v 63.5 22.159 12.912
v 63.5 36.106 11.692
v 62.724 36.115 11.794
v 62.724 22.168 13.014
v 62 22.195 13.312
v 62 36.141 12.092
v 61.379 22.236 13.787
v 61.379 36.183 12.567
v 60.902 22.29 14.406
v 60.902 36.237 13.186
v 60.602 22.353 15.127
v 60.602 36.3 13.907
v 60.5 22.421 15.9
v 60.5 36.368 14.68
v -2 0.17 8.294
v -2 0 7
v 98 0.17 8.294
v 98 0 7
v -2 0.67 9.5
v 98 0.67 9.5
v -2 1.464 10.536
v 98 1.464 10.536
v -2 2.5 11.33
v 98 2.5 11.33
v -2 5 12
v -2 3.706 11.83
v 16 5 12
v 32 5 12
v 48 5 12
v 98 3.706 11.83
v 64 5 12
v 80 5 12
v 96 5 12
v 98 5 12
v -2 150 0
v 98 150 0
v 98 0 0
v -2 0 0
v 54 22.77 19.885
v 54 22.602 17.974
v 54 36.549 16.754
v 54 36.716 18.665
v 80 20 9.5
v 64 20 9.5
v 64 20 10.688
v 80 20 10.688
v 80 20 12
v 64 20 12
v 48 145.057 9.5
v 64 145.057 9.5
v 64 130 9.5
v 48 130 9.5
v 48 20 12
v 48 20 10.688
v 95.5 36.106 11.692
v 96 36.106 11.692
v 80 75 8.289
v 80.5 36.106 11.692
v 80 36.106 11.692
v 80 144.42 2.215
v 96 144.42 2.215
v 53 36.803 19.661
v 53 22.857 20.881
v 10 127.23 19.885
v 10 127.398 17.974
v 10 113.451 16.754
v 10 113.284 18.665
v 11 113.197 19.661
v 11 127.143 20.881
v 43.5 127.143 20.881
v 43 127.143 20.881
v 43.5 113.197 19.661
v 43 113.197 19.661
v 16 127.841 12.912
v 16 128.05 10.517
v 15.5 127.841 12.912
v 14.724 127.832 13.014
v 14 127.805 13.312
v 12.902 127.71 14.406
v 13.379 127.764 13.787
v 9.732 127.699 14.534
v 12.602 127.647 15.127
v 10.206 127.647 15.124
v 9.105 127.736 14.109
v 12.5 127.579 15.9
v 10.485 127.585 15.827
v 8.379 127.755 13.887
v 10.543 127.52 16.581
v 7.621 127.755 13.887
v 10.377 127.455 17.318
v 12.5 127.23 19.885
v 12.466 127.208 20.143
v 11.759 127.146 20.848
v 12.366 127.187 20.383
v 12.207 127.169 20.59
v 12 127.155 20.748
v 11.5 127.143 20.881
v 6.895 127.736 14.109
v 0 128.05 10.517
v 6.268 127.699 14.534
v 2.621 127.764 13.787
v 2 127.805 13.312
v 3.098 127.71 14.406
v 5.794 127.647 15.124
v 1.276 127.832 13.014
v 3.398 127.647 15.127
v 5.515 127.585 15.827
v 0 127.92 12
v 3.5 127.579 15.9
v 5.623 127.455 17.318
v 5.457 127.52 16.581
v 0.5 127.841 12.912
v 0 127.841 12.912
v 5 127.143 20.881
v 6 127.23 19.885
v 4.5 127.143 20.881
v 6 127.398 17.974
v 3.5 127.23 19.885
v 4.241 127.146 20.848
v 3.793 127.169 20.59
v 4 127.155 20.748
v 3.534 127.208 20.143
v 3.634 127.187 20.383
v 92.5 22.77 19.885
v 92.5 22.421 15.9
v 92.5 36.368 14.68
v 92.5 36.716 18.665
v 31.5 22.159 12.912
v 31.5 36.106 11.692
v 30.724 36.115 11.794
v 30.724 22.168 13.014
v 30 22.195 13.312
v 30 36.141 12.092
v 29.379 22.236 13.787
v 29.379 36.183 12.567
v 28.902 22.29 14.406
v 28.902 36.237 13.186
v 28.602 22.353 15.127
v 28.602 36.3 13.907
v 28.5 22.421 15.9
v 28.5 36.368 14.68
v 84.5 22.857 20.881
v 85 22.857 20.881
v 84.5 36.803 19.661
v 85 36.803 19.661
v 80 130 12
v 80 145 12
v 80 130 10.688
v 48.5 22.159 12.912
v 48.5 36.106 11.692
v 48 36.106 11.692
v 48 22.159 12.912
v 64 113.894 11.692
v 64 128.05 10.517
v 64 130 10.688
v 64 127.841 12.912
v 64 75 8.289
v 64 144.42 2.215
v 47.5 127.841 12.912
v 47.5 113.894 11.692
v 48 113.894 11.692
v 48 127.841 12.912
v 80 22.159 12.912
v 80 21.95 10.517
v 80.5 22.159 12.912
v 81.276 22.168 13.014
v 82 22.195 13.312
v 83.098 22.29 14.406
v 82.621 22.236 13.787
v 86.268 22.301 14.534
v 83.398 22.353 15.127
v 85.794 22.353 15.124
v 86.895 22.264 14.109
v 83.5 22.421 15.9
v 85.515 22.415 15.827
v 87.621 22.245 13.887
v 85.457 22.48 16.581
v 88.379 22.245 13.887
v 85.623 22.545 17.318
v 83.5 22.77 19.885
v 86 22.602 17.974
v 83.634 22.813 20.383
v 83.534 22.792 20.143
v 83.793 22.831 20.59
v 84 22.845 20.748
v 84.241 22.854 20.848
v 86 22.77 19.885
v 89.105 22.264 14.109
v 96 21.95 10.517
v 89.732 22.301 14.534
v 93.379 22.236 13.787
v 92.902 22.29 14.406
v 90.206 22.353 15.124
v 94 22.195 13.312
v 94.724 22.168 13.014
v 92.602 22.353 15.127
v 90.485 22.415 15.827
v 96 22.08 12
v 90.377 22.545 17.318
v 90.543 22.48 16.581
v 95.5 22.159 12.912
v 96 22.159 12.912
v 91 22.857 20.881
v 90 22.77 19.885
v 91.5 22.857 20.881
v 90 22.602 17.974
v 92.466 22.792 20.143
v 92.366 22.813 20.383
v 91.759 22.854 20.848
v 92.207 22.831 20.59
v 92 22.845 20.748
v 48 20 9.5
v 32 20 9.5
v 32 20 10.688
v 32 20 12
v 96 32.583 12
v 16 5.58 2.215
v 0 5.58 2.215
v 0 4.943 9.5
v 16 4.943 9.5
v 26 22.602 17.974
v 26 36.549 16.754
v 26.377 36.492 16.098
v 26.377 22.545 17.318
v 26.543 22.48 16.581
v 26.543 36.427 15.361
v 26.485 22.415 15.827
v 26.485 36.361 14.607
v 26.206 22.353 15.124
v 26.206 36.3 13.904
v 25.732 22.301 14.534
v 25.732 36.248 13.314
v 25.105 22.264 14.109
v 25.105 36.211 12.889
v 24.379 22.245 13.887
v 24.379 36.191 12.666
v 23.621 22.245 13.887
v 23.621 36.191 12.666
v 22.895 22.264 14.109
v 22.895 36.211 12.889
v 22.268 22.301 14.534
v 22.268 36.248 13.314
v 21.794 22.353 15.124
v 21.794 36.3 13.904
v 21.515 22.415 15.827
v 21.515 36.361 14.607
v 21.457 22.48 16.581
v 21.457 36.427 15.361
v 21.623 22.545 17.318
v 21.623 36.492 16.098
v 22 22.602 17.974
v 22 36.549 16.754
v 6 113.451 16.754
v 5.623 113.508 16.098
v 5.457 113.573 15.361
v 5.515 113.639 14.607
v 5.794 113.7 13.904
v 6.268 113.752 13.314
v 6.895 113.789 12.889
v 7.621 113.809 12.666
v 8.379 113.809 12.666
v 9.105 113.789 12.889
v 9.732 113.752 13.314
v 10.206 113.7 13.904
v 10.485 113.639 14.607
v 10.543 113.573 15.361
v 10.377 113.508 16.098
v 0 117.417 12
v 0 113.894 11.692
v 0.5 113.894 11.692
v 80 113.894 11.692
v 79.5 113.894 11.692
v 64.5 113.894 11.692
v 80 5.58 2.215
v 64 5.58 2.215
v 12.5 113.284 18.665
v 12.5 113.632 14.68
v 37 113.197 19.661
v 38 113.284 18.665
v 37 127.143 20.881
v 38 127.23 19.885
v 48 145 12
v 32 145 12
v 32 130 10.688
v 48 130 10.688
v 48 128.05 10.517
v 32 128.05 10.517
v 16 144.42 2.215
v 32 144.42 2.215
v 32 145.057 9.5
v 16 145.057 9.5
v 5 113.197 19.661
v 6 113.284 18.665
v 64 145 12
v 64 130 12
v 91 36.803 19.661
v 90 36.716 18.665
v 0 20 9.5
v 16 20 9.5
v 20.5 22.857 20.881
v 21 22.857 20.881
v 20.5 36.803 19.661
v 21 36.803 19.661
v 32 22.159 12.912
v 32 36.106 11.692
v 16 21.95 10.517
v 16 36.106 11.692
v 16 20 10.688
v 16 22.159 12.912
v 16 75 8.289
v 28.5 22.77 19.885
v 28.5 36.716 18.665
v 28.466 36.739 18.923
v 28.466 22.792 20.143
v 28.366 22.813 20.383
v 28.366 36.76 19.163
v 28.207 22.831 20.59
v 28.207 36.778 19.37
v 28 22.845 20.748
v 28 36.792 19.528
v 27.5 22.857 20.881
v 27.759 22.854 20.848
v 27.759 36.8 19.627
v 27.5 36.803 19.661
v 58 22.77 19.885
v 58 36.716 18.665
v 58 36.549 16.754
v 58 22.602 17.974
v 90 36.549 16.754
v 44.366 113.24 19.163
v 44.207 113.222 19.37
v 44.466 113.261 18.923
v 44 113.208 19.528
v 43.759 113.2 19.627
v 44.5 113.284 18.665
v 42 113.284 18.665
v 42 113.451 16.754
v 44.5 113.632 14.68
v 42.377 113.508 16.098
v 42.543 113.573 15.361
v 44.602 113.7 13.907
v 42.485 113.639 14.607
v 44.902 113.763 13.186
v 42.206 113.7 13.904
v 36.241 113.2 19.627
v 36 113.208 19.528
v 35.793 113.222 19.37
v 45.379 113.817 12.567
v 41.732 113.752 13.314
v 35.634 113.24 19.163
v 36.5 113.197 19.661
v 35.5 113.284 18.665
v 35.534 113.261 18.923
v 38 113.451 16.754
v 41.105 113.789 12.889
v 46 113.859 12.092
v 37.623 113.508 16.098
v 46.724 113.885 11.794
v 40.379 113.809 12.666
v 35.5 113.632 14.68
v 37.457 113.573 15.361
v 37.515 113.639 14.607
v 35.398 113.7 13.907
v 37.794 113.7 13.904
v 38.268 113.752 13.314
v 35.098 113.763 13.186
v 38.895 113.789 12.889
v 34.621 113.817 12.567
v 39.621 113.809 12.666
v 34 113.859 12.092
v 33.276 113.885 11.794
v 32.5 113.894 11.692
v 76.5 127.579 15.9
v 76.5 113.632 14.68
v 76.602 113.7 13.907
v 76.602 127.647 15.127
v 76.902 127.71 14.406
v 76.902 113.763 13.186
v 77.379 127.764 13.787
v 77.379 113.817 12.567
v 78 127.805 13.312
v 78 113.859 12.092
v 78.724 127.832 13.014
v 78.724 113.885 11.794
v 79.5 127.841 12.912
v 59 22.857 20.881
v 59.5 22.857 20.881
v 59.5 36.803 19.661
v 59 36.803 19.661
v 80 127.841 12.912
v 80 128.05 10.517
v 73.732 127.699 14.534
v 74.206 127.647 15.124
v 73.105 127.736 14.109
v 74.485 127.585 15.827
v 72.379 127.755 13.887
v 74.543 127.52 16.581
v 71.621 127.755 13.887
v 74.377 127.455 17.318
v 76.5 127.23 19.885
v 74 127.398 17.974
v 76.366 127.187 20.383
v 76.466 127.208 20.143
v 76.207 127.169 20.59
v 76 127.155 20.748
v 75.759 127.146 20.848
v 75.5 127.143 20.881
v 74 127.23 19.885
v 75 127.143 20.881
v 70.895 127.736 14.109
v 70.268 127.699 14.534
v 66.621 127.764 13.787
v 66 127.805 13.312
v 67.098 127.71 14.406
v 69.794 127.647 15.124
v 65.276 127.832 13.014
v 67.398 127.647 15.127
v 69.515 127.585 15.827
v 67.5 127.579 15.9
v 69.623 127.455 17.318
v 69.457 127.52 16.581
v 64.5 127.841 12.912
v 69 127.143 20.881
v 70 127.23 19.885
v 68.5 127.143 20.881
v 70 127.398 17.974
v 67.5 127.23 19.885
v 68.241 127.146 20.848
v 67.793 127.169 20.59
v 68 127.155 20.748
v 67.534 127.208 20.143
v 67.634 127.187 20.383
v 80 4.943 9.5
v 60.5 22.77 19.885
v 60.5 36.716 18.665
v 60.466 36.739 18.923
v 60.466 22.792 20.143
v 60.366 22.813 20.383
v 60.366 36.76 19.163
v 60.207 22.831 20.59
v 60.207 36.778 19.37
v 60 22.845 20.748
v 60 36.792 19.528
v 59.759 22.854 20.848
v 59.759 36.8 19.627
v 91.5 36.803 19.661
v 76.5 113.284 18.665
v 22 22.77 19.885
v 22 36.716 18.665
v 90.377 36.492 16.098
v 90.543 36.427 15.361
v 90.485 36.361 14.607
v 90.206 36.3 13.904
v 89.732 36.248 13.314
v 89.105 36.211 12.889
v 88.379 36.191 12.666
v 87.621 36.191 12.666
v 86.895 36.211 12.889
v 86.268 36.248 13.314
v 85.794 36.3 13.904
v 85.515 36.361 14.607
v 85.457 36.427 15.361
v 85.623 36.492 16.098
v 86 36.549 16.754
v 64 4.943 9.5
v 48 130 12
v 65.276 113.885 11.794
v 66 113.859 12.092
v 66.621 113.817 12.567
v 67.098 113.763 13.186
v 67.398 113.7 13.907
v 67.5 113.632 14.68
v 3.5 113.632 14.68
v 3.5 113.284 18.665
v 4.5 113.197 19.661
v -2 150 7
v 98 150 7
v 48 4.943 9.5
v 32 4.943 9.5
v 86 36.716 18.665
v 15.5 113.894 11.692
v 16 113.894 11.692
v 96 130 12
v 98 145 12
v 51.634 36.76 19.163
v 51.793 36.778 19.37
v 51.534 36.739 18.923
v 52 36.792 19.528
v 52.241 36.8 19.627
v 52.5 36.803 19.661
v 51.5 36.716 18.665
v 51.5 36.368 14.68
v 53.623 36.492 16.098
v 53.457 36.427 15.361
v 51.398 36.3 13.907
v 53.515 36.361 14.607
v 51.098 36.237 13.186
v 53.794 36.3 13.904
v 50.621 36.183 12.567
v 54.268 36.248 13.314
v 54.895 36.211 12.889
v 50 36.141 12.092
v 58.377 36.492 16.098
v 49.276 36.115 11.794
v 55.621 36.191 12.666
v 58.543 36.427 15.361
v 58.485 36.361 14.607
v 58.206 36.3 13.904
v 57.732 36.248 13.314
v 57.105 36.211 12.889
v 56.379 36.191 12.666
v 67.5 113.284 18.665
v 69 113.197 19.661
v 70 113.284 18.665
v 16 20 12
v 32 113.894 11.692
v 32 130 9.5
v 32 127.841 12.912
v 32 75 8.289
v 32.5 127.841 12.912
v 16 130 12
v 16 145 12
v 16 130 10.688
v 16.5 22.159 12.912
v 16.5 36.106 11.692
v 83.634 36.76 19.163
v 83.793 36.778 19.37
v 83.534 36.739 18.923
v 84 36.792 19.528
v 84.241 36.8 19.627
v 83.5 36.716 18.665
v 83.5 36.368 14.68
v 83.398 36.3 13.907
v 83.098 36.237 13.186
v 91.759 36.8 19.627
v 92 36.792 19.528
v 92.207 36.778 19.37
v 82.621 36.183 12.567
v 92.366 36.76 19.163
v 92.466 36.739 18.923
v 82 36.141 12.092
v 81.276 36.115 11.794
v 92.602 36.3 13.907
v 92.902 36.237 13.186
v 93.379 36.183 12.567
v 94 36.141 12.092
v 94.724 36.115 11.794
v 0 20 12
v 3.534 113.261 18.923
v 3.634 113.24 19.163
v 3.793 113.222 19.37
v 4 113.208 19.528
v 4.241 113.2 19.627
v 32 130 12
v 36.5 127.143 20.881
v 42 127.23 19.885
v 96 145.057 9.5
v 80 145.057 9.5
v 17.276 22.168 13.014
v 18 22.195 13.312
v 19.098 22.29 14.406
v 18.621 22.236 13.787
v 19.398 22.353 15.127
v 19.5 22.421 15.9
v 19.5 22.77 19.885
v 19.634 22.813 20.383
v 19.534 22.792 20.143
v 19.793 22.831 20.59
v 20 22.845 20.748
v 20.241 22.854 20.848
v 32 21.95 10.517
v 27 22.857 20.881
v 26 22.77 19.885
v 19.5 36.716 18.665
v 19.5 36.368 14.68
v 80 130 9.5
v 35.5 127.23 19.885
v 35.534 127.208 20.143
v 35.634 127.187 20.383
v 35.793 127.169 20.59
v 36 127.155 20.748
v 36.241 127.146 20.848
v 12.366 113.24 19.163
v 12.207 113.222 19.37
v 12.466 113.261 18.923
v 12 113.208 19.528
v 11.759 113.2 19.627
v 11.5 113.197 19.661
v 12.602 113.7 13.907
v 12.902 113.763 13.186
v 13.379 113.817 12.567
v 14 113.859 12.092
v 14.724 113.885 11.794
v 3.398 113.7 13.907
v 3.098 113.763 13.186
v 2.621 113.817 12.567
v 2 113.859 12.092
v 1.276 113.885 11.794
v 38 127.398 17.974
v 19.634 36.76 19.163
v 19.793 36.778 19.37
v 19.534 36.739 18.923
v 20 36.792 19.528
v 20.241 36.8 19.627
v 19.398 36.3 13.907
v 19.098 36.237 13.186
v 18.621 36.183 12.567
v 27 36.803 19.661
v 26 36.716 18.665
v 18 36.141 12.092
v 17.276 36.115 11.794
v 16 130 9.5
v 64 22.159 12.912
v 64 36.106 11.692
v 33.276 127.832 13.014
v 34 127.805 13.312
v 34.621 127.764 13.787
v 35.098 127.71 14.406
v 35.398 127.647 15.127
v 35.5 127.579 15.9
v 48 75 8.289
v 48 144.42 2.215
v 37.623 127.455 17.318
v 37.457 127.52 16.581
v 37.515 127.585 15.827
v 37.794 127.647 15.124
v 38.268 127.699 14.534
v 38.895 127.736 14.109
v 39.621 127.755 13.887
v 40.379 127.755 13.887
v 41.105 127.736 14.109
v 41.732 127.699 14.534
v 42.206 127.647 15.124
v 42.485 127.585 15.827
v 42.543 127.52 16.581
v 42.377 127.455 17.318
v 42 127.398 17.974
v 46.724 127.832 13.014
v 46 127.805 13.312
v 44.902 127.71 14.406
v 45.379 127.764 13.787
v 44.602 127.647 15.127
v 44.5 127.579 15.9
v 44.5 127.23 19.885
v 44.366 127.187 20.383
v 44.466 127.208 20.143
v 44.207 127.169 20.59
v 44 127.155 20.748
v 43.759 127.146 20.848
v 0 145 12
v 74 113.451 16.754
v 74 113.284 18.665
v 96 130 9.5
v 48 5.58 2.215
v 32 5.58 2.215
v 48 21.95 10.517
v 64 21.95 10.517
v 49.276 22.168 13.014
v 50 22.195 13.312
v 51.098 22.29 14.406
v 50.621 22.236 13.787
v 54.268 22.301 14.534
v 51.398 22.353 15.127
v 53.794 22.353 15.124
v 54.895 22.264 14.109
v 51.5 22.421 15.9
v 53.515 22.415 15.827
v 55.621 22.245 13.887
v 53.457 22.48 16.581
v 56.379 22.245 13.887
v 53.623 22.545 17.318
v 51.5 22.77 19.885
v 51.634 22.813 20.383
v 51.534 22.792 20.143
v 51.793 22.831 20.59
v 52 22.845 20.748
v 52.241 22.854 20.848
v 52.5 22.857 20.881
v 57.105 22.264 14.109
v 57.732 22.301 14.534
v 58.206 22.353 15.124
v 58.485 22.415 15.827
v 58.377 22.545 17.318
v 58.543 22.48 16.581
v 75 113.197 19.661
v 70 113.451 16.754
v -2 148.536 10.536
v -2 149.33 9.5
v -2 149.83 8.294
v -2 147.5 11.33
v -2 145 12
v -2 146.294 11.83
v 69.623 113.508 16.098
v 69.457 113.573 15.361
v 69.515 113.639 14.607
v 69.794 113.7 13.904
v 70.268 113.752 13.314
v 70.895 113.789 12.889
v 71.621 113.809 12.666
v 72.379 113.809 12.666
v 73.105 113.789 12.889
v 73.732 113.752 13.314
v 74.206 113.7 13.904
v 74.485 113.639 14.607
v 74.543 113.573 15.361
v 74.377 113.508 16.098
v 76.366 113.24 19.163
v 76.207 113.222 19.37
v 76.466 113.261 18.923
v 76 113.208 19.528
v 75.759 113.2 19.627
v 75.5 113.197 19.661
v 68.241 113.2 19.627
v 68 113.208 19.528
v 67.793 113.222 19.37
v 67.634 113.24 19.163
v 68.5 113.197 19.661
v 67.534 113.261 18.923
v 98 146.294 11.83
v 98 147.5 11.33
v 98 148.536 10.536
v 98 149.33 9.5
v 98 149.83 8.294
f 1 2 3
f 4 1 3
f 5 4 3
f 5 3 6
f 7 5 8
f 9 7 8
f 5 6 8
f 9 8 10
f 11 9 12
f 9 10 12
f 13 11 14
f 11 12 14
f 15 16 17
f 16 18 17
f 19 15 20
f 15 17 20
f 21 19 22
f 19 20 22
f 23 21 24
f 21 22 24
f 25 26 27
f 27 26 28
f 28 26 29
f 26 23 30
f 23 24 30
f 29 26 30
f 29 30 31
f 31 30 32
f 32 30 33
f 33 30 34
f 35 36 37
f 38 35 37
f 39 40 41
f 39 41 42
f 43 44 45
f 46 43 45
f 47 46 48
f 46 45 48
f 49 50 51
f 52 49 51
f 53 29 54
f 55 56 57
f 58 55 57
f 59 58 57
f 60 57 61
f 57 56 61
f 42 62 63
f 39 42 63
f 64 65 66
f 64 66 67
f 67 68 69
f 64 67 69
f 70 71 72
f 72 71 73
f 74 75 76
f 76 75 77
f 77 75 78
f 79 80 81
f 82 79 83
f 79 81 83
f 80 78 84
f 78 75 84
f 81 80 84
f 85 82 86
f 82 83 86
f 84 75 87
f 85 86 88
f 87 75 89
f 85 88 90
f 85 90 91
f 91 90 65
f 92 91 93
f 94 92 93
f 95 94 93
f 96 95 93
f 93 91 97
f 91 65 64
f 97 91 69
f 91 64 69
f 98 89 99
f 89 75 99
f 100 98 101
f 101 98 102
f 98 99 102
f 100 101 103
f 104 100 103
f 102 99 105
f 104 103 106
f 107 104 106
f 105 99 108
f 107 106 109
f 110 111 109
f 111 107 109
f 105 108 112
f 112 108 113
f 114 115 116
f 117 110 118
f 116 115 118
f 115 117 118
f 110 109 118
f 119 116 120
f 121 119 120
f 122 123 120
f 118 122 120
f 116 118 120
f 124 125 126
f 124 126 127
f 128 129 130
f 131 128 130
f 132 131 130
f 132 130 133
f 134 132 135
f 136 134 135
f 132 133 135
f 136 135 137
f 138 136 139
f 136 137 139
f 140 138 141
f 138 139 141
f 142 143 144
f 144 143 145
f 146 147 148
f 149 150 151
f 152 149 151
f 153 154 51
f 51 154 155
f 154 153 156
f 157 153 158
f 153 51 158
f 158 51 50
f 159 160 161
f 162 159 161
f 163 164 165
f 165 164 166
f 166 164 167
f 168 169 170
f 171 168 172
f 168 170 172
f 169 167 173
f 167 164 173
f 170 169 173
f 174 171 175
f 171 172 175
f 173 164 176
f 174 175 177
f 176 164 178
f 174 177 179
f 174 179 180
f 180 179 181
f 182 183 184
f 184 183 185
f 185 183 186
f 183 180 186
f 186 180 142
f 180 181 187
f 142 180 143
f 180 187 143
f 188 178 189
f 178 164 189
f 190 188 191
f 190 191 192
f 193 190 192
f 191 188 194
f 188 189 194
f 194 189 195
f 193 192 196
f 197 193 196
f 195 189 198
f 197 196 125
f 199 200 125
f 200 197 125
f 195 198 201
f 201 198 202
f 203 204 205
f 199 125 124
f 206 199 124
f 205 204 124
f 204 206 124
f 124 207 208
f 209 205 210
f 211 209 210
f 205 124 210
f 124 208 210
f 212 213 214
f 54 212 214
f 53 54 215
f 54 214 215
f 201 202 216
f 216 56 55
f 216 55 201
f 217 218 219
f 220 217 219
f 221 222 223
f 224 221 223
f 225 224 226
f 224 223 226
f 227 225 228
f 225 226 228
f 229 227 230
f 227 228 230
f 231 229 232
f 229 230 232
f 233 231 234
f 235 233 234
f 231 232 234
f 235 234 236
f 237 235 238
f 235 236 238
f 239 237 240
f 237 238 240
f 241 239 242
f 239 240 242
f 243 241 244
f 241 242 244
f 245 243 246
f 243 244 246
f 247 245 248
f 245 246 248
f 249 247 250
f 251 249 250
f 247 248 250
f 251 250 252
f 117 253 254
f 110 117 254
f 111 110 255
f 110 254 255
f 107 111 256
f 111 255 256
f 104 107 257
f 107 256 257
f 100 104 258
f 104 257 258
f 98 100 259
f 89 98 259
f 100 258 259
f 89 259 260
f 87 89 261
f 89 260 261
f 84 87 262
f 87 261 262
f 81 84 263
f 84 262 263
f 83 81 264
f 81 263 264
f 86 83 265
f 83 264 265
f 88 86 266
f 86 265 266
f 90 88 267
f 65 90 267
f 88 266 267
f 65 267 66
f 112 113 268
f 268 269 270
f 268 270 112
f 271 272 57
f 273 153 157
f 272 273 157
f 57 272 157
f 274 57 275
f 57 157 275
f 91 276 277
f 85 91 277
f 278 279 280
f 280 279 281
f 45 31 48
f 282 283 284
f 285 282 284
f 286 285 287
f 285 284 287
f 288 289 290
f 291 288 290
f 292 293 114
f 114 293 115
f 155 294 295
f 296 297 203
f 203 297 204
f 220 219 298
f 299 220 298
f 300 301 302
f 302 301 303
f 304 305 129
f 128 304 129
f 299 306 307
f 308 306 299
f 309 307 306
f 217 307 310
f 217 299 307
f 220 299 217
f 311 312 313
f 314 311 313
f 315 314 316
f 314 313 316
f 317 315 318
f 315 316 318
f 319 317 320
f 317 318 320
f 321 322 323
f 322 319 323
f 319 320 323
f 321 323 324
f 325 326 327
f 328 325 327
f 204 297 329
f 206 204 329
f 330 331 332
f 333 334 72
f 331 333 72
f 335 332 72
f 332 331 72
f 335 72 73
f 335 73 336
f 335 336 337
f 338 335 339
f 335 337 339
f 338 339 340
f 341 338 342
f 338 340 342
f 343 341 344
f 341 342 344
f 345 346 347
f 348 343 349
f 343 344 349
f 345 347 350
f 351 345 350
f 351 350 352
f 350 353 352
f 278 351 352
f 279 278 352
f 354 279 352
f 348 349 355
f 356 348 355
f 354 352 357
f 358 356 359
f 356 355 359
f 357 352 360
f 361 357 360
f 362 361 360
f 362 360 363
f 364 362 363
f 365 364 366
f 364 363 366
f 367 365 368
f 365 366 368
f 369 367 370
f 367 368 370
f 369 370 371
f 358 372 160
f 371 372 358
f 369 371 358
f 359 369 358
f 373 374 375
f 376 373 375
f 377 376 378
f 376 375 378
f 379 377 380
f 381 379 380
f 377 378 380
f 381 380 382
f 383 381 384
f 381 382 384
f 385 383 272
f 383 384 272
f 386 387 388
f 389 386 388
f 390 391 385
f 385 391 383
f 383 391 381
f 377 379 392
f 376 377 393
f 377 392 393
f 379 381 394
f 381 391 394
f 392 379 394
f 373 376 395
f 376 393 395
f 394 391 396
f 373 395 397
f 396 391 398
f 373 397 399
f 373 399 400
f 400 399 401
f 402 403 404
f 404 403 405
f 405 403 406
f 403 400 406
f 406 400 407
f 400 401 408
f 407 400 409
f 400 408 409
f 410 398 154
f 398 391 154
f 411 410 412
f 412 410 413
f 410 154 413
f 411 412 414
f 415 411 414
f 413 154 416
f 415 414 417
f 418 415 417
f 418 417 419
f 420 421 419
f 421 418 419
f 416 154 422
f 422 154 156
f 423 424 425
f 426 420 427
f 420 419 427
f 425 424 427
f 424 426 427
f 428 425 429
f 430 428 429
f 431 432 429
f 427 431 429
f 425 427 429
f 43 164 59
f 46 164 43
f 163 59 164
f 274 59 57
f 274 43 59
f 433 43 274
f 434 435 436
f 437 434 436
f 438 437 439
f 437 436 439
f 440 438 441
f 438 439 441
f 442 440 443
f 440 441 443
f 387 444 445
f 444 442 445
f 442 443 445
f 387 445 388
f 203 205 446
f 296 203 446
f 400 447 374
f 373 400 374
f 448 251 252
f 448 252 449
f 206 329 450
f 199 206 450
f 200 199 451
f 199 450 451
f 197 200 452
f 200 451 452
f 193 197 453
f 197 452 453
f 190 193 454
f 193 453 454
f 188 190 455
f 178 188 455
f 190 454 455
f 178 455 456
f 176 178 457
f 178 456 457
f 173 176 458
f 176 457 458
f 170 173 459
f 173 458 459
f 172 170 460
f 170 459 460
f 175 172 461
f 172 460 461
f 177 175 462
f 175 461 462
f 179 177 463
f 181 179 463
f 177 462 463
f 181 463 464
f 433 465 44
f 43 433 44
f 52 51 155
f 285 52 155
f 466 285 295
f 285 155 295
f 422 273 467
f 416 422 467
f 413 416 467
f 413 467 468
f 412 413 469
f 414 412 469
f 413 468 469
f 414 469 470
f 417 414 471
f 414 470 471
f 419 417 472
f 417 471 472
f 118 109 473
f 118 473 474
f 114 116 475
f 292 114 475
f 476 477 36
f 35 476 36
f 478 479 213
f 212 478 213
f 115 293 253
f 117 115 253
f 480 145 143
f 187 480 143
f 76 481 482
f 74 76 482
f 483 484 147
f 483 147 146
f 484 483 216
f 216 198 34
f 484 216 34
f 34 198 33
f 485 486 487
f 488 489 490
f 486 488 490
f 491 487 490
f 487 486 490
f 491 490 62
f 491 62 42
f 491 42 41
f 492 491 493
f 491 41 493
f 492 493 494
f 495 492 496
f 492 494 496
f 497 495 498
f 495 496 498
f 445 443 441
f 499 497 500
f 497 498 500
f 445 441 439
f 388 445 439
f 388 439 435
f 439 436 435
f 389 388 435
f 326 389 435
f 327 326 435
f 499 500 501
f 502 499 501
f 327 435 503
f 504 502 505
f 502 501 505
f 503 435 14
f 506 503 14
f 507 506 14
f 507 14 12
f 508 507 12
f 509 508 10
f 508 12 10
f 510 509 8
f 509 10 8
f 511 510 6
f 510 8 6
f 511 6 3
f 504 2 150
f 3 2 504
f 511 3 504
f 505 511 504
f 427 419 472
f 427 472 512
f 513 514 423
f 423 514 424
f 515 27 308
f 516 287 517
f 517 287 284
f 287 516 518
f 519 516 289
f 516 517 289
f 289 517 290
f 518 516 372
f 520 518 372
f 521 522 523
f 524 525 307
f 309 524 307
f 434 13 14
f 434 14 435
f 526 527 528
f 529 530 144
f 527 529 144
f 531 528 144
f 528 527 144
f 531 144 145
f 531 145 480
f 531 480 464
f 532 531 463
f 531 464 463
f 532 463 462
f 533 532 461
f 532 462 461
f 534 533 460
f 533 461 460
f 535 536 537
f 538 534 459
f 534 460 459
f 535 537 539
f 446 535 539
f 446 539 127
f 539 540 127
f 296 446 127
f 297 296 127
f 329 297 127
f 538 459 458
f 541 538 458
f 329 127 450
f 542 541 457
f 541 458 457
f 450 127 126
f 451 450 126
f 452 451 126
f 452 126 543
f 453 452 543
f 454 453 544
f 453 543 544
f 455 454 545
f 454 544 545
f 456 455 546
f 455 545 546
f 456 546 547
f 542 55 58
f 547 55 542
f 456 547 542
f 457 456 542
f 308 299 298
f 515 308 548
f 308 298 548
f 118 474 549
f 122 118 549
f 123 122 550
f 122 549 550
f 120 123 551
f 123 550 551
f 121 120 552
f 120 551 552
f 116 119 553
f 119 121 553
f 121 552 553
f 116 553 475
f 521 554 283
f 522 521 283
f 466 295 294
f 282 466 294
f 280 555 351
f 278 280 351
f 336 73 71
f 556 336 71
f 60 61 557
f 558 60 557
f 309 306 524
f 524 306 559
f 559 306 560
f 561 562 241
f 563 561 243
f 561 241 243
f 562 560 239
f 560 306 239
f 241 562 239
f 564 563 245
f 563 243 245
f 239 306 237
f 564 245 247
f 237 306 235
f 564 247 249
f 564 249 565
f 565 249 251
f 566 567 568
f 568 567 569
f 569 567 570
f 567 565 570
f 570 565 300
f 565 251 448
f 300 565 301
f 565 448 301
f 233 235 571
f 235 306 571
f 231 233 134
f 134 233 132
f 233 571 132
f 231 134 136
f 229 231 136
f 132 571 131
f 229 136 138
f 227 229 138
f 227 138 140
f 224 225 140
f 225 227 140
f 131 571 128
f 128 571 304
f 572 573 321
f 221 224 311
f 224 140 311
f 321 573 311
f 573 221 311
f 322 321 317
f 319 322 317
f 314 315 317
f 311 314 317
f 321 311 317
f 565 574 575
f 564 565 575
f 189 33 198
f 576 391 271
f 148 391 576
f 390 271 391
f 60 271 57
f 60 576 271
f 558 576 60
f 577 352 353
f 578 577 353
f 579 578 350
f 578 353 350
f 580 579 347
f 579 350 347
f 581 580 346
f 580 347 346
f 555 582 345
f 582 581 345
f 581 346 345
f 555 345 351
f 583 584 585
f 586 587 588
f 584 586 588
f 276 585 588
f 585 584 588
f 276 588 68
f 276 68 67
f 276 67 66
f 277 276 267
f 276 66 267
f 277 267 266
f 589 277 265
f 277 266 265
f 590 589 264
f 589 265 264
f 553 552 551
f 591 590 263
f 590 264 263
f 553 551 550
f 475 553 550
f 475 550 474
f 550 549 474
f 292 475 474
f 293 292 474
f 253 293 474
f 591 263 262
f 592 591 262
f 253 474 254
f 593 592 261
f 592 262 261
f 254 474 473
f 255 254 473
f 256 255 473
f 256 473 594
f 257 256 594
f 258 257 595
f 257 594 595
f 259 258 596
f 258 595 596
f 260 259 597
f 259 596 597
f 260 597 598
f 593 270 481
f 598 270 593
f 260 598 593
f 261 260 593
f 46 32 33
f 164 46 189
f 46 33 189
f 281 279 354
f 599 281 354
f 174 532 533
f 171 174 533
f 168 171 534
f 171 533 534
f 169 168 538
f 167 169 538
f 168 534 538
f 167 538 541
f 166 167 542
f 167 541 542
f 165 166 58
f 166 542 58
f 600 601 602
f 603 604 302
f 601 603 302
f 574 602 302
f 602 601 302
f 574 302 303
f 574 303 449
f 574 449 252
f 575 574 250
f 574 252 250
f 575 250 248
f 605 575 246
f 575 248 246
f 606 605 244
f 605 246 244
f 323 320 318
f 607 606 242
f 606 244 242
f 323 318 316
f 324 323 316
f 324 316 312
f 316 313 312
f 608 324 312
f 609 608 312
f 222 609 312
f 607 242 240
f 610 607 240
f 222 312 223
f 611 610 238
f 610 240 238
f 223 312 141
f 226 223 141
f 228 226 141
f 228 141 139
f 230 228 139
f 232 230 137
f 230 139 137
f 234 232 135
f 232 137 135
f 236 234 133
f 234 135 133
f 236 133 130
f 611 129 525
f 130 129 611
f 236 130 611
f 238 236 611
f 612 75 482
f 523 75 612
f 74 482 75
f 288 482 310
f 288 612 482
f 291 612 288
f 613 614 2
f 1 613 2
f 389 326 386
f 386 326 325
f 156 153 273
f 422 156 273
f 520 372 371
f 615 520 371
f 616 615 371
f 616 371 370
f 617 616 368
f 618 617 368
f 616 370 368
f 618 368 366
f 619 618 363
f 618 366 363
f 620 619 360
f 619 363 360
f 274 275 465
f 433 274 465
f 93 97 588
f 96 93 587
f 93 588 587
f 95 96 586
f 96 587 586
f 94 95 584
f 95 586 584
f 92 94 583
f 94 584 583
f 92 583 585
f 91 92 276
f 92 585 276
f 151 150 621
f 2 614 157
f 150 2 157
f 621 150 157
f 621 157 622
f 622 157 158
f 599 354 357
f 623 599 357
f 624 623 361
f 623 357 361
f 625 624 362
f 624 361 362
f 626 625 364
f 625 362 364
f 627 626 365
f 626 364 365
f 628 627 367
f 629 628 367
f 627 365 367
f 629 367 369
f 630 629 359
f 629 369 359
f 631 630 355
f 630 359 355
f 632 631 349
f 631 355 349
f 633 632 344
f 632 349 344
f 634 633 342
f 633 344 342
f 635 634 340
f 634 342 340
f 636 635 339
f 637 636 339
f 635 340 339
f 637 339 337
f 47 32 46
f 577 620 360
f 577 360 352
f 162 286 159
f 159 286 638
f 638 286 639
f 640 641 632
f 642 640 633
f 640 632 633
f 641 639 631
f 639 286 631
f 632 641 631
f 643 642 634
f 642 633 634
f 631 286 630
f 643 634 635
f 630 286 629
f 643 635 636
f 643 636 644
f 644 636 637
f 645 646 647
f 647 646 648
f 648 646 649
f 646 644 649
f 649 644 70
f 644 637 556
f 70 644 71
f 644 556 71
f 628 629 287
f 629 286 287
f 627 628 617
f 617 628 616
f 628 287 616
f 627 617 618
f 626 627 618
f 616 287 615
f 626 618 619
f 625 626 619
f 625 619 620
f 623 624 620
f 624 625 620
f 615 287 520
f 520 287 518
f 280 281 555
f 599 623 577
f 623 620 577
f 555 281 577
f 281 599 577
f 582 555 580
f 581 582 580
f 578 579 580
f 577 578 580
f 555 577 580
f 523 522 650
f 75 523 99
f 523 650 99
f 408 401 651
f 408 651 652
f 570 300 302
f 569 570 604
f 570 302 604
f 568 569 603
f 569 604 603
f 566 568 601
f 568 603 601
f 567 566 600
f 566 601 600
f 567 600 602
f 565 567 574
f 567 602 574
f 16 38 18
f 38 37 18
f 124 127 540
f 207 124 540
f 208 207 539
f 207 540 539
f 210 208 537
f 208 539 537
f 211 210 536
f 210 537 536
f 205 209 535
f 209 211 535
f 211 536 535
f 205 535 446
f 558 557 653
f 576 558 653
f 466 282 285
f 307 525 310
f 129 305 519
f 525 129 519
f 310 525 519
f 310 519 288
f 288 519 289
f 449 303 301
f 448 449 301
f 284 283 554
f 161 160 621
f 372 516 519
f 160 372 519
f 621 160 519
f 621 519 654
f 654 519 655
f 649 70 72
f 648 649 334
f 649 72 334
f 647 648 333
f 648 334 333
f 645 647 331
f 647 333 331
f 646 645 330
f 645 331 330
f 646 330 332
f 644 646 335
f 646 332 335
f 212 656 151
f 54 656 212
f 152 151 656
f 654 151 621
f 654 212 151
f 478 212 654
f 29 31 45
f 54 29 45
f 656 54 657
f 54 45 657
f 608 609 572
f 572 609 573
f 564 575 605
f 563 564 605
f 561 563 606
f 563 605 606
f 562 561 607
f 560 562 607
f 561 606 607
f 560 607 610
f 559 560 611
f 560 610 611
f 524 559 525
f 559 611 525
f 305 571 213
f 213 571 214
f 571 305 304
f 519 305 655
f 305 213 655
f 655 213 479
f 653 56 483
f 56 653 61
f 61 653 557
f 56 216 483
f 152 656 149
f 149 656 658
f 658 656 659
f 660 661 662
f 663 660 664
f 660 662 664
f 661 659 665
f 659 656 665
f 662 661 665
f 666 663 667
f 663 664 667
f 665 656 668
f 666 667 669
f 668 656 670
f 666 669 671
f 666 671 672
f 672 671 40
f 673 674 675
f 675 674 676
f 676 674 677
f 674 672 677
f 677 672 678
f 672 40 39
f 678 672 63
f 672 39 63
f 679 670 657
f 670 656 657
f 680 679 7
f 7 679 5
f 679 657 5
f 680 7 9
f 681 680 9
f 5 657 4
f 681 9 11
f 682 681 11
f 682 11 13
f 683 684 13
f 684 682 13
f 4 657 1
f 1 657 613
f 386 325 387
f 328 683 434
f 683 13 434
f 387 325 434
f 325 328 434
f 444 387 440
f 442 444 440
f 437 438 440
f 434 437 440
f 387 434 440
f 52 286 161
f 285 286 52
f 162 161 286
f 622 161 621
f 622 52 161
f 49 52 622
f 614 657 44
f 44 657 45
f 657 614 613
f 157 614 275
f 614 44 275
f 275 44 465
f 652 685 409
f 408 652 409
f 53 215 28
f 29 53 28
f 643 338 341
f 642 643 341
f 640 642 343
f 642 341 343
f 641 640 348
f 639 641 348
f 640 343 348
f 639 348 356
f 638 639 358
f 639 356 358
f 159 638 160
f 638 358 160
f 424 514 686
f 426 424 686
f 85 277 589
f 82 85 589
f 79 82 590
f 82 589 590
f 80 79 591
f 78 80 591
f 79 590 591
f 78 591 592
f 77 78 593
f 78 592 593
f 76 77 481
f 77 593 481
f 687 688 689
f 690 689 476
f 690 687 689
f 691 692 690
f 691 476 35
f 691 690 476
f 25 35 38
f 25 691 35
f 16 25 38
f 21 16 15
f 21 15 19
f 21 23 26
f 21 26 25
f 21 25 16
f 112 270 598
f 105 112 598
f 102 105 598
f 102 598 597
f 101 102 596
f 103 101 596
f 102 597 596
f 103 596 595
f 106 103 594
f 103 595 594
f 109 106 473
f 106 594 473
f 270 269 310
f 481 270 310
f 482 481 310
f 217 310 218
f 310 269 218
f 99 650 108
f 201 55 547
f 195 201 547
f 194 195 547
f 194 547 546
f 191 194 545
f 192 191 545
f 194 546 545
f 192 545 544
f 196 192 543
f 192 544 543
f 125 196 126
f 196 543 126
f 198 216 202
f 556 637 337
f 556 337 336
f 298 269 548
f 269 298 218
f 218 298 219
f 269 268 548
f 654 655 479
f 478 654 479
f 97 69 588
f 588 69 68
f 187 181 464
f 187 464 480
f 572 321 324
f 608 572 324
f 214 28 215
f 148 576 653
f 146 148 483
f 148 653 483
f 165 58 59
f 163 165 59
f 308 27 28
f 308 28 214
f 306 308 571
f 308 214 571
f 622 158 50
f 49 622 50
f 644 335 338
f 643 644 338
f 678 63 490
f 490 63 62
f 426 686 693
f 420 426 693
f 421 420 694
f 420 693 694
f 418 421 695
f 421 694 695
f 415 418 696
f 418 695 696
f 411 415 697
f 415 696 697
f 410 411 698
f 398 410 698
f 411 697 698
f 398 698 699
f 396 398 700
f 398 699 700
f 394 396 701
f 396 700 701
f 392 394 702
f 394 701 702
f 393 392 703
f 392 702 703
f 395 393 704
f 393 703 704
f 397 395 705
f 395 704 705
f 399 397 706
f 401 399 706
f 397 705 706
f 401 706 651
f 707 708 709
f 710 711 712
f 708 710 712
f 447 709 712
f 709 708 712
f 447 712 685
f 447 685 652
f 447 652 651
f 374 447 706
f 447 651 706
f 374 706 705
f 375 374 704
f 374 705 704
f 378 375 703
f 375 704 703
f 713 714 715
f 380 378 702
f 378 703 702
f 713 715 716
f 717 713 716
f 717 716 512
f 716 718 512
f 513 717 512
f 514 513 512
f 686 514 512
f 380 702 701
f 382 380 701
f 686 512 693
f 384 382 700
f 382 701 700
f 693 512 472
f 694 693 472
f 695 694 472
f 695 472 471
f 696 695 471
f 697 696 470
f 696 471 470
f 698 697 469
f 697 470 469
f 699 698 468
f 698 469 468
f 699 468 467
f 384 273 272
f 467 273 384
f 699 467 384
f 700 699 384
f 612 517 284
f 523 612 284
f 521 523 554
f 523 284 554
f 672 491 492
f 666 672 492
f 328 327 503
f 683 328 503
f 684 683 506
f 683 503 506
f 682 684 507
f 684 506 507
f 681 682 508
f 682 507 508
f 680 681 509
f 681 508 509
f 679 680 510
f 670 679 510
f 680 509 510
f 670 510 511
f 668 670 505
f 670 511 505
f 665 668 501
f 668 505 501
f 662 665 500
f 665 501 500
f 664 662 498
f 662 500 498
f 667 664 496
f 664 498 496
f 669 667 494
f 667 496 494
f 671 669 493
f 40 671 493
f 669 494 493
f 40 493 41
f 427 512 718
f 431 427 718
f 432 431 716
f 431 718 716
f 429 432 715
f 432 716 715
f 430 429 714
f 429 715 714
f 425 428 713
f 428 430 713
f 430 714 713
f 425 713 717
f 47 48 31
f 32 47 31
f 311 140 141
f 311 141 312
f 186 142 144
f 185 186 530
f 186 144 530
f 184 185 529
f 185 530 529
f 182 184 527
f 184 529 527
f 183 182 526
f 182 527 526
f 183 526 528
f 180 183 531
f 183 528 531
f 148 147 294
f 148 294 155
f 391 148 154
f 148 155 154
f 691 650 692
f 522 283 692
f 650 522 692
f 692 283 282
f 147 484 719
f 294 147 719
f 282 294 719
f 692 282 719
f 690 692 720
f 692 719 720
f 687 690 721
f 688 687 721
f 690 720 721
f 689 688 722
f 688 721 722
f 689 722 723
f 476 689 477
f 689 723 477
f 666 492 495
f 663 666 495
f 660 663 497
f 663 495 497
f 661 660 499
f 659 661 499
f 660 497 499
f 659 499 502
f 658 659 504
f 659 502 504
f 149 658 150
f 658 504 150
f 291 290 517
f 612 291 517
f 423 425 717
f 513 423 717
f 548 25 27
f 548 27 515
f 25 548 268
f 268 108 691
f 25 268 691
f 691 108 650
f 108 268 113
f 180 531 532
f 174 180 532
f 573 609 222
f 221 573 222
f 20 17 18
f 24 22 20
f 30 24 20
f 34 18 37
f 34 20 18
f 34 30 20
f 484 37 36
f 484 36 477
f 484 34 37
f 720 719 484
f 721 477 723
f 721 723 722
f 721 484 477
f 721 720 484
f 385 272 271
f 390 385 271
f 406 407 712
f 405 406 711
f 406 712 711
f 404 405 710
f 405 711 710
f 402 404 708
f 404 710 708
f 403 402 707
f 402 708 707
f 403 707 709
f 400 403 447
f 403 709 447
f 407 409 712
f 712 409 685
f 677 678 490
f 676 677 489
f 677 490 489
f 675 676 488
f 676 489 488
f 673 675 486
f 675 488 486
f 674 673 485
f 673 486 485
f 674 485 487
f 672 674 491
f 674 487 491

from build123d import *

# Parameters (mm, degrees)
F1_DEPTH  = 16
F3_DEPTH  = 25
F4_SIZE   = 1
F11_ANGLE = 180
F14_DEPTH = 2
F16_DEPTH = 2


with BuildPart() as f1:
    # F0 (on Right) → F1 (new body)
    with BuildSketch(Plane.YZ):
        with BuildLine():
            Line((0, 7), (0, 0))
            Line((0, 0), (150, 0))
            Line((150, 0), (150, 7))
            ThreePointArc((150, 7), (148.5355339059, 10.5355339059), (145, 12))
            Line((145, 12), (128.050036002, 10.517070303))
            Line((128.050036002, 10.517070303), (127.1432693018, 20.8814611121))
            Line((127.1432693018, 20.8814611121), (113.1965435286, 19.6612807136))
            Line((113.1965435286, 19.6612807136), (113.8937894705, 11.6917231289))
            Line((113.8937894705, 11.6917231289), (5.5800139851, 2.2154956702))
            Line((5.5800139851, 2.2154956702), (4.9427024368, 9.5))
            Line((4.9427024368, 9.5), (20, 9.5))
            Line((20, 9.5), (20, 12))
            Line((20, 12), (5, 12))
            ThreePointArc((5, 12), (1.4644660941, 10.5355339059), (0, 7))
        make_face()
    extrude(amount=F1_DEPTH)

    # F2 (on face) → F3 (cut)
    with BuildSketch(Plane(origin=(0, 114.0437613881, 9.9775362673), x_dir=(1, 0, 0), z_dir=(0, -0.9961946981, -0.0871557427))):
        with BuildLine():
            Line((6, 9.7207347769), (6, 6.8026639789))
            ThreePointArc((6, 6.8026639789), (8, 2.6707347769), (10, 6.8026639789))
            Line((10, 6.8026639789), (10, 9.7207347769))
            Line((10, 9.7207347769), (11.5, 9.7207347769))
            ThreePointArc((11.5, 9.7207347769), (12.2071067812, 9.4278415581), (12.5, 8.7207347769))
            Line((12.5, 8.7207347769), (12.5, 4.7207347769))
            ThreePointArc((12.5, 4.7207347769), (13.3786796564, 2.5994144334), (15.5, 1.7207347769))
            Line((15.5, 1.7207347769), (18.5, 1.7207347769))
            Line((18.5, 1.7207347769), (18.5, 10.7207347769))
            Line((18.5, 10.7207347769), (-2.5, 10.7207347769))
            Line((-2.5, 10.7207347769), (-2.5, 1.7207347769))
            Line((-2.5, 1.7207347769), (0.5, 1.7207347769))
            ThreePointArc((0.5, 1.7207347769), (2.6213203436, 2.5994144334), (3.5, 4.7207347769))
            Line((3.5, 4.7207347769), (3.5, 8.7207347769))
            ThreePointArc((3.5, 8.7207347769), (3.7928932188, 9.4278415581), (4.5, 9.7207347769))
            Line((4.5, 9.7207347769), (6, 9.7207347769))
        make_face()
    extrude(amount=-F3_DEPTH, mode=Mode.SUBTRACT)

    # F4
    f4_edges = [f1.edges().sort_by_distance(p)[0] for p in [
        (6, 120.169906, 20.271371),
        (10, 120.169906, 20.271371),
    ]]
    chamfer(f4_edges, length=F4_SIZE)


with BuildPart() as f5_1:
    # F5: copy of F1
    add(f1.part.moved(Location((32, 0, 0))))


with BuildPart() as f6_1:
    # F6: copy of F5_1
    add(f5_1.part.moved(Location((32, 0, 0))))


with BuildPart() as f7_1:
    # F7: copy of F1
    add(f1.part.moved(Location((0, 160, 0))))


with BuildPart() as f8_1:
    # F8: copy of F5_1
    add(f5_1.part.moved(Location((0, 160, 0))))


with BuildPart() as f9_1:
    # F9: copy of F6_1
    add(f6_1.part.moved(Location((0, 160, 0))))


with BuildPart() as f8_1_1:
    # F11: moved
    add(f8_1.part.rotate(Axis((0, 0, 25), (0, 0, 1)), F11_ANGLE))


with BuildPart() as f9_1_1:
    # F11: moved
    add(f9_1.part.rotate(Axis((0, 0, 25), (0, 0, 1)), F11_ANGLE))


with BuildPart() as f7_1_1:
    # F11: moved
    add(f7_1.part.rotate(Axis((0, 0, 25), (0, 0, 1)), F11_ANGLE))


with BuildPart() as f7_1_2:
    # F12: moved
    add(f7_1_1.part.moved(Location((96, 310, 0))))

    # F13 (on face) → F14 (join)
    with BuildSketch(Plane.YZ.offset(96)):
        with BuildLine():
            Line((0, 7), (0, 0))
            Line((0, 0), (150, 0))
            Line((150, 0), (150, 7))
            ThreePointArc((150, 7), (148.5355339059, 10.5355339059), (145, 12))
            Line((145, 12), (5, 12))
            ThreePointArc((5, 12), (1.4644660941, 10.5355339059), (0, 7))
        make_face()
    extrude(amount=F14_DEPTH)


with BuildPart() as f8_1_2:
    # F12: moved
    add(f8_1_1.part.moved(Location((96, 310, 0))))


with BuildPart() as f9_1_2:
    # F12: moved
    add(f9_1_1.part.moved(Location((96, 310, 0))))


with BuildPart() as f1_1:
    add(f1.part)

    add(f5_1.part)  # F16 merges F5_1

    add(f6_1.part)  # F16 merges F6_1

    add(f7_1_2.part)  # F16 merges F7_1

    add(f8_1_2.part)  # F16 merges F8_1

    add(f9_1_2.part)  # F16 merges F9_1
    # F15 (on face) → F16 (join)
    with BuildSketch(Plane(origin=(0, 0, 0), x_dir=(0, -1, 0), z_dir=(-1, 0, 0))):
        with BuildLine():
            Line((-150, 0), (0, 0))
            Line((0, 0), (0, 7))
            ThreePointArc((0, 7), (-1.4644660941, 10.5355339059), (-5, 12))
            Line((-5, 12), (-145, 12))
            ThreePointArc((-145, 12), (-148.5355339059, 10.5355339059), (-150, 7))
            Line((-150, 7), (-150, 0))
        make_face()
    extrude(amount=F16_DEPTH)


solid = f1_1.part
